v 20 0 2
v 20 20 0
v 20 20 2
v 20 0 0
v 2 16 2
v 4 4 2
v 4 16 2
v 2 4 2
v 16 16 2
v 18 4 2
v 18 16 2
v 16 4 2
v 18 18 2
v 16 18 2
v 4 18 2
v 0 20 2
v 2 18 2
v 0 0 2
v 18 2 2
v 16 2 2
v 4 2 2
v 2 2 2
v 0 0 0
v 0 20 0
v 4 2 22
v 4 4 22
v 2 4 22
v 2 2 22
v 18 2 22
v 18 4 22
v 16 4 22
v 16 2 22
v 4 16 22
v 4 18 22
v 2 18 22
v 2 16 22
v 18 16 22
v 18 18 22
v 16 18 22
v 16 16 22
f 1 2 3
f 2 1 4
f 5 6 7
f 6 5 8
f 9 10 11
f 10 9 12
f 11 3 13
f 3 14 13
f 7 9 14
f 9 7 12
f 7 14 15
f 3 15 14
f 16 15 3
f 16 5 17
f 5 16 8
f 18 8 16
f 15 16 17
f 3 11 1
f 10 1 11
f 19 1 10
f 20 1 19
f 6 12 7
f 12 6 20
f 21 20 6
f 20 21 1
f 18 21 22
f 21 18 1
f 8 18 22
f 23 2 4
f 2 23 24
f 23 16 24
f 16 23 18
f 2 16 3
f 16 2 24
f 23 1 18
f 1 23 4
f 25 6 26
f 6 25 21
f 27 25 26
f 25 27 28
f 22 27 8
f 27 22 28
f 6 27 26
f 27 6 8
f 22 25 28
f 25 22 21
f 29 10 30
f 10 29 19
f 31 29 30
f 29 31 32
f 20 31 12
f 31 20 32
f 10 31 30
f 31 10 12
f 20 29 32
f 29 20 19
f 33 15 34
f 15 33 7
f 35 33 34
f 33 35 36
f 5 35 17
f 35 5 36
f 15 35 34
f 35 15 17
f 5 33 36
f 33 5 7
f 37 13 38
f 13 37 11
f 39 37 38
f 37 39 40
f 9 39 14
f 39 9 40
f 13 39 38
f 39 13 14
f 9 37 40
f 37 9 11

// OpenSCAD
$fn=128;
scale([2, 2, 2]){
cube([10, 10, 1]);
translate([1, 1, 1]) cube([1, 1, 10]);
translate([8, 1, 1]) cube([1, 1, 10]);
translate([1, 8, 1]) cube([1, 1, 10]);
translate([8, 8, 1]) cube([1, 1, 10]);
}
